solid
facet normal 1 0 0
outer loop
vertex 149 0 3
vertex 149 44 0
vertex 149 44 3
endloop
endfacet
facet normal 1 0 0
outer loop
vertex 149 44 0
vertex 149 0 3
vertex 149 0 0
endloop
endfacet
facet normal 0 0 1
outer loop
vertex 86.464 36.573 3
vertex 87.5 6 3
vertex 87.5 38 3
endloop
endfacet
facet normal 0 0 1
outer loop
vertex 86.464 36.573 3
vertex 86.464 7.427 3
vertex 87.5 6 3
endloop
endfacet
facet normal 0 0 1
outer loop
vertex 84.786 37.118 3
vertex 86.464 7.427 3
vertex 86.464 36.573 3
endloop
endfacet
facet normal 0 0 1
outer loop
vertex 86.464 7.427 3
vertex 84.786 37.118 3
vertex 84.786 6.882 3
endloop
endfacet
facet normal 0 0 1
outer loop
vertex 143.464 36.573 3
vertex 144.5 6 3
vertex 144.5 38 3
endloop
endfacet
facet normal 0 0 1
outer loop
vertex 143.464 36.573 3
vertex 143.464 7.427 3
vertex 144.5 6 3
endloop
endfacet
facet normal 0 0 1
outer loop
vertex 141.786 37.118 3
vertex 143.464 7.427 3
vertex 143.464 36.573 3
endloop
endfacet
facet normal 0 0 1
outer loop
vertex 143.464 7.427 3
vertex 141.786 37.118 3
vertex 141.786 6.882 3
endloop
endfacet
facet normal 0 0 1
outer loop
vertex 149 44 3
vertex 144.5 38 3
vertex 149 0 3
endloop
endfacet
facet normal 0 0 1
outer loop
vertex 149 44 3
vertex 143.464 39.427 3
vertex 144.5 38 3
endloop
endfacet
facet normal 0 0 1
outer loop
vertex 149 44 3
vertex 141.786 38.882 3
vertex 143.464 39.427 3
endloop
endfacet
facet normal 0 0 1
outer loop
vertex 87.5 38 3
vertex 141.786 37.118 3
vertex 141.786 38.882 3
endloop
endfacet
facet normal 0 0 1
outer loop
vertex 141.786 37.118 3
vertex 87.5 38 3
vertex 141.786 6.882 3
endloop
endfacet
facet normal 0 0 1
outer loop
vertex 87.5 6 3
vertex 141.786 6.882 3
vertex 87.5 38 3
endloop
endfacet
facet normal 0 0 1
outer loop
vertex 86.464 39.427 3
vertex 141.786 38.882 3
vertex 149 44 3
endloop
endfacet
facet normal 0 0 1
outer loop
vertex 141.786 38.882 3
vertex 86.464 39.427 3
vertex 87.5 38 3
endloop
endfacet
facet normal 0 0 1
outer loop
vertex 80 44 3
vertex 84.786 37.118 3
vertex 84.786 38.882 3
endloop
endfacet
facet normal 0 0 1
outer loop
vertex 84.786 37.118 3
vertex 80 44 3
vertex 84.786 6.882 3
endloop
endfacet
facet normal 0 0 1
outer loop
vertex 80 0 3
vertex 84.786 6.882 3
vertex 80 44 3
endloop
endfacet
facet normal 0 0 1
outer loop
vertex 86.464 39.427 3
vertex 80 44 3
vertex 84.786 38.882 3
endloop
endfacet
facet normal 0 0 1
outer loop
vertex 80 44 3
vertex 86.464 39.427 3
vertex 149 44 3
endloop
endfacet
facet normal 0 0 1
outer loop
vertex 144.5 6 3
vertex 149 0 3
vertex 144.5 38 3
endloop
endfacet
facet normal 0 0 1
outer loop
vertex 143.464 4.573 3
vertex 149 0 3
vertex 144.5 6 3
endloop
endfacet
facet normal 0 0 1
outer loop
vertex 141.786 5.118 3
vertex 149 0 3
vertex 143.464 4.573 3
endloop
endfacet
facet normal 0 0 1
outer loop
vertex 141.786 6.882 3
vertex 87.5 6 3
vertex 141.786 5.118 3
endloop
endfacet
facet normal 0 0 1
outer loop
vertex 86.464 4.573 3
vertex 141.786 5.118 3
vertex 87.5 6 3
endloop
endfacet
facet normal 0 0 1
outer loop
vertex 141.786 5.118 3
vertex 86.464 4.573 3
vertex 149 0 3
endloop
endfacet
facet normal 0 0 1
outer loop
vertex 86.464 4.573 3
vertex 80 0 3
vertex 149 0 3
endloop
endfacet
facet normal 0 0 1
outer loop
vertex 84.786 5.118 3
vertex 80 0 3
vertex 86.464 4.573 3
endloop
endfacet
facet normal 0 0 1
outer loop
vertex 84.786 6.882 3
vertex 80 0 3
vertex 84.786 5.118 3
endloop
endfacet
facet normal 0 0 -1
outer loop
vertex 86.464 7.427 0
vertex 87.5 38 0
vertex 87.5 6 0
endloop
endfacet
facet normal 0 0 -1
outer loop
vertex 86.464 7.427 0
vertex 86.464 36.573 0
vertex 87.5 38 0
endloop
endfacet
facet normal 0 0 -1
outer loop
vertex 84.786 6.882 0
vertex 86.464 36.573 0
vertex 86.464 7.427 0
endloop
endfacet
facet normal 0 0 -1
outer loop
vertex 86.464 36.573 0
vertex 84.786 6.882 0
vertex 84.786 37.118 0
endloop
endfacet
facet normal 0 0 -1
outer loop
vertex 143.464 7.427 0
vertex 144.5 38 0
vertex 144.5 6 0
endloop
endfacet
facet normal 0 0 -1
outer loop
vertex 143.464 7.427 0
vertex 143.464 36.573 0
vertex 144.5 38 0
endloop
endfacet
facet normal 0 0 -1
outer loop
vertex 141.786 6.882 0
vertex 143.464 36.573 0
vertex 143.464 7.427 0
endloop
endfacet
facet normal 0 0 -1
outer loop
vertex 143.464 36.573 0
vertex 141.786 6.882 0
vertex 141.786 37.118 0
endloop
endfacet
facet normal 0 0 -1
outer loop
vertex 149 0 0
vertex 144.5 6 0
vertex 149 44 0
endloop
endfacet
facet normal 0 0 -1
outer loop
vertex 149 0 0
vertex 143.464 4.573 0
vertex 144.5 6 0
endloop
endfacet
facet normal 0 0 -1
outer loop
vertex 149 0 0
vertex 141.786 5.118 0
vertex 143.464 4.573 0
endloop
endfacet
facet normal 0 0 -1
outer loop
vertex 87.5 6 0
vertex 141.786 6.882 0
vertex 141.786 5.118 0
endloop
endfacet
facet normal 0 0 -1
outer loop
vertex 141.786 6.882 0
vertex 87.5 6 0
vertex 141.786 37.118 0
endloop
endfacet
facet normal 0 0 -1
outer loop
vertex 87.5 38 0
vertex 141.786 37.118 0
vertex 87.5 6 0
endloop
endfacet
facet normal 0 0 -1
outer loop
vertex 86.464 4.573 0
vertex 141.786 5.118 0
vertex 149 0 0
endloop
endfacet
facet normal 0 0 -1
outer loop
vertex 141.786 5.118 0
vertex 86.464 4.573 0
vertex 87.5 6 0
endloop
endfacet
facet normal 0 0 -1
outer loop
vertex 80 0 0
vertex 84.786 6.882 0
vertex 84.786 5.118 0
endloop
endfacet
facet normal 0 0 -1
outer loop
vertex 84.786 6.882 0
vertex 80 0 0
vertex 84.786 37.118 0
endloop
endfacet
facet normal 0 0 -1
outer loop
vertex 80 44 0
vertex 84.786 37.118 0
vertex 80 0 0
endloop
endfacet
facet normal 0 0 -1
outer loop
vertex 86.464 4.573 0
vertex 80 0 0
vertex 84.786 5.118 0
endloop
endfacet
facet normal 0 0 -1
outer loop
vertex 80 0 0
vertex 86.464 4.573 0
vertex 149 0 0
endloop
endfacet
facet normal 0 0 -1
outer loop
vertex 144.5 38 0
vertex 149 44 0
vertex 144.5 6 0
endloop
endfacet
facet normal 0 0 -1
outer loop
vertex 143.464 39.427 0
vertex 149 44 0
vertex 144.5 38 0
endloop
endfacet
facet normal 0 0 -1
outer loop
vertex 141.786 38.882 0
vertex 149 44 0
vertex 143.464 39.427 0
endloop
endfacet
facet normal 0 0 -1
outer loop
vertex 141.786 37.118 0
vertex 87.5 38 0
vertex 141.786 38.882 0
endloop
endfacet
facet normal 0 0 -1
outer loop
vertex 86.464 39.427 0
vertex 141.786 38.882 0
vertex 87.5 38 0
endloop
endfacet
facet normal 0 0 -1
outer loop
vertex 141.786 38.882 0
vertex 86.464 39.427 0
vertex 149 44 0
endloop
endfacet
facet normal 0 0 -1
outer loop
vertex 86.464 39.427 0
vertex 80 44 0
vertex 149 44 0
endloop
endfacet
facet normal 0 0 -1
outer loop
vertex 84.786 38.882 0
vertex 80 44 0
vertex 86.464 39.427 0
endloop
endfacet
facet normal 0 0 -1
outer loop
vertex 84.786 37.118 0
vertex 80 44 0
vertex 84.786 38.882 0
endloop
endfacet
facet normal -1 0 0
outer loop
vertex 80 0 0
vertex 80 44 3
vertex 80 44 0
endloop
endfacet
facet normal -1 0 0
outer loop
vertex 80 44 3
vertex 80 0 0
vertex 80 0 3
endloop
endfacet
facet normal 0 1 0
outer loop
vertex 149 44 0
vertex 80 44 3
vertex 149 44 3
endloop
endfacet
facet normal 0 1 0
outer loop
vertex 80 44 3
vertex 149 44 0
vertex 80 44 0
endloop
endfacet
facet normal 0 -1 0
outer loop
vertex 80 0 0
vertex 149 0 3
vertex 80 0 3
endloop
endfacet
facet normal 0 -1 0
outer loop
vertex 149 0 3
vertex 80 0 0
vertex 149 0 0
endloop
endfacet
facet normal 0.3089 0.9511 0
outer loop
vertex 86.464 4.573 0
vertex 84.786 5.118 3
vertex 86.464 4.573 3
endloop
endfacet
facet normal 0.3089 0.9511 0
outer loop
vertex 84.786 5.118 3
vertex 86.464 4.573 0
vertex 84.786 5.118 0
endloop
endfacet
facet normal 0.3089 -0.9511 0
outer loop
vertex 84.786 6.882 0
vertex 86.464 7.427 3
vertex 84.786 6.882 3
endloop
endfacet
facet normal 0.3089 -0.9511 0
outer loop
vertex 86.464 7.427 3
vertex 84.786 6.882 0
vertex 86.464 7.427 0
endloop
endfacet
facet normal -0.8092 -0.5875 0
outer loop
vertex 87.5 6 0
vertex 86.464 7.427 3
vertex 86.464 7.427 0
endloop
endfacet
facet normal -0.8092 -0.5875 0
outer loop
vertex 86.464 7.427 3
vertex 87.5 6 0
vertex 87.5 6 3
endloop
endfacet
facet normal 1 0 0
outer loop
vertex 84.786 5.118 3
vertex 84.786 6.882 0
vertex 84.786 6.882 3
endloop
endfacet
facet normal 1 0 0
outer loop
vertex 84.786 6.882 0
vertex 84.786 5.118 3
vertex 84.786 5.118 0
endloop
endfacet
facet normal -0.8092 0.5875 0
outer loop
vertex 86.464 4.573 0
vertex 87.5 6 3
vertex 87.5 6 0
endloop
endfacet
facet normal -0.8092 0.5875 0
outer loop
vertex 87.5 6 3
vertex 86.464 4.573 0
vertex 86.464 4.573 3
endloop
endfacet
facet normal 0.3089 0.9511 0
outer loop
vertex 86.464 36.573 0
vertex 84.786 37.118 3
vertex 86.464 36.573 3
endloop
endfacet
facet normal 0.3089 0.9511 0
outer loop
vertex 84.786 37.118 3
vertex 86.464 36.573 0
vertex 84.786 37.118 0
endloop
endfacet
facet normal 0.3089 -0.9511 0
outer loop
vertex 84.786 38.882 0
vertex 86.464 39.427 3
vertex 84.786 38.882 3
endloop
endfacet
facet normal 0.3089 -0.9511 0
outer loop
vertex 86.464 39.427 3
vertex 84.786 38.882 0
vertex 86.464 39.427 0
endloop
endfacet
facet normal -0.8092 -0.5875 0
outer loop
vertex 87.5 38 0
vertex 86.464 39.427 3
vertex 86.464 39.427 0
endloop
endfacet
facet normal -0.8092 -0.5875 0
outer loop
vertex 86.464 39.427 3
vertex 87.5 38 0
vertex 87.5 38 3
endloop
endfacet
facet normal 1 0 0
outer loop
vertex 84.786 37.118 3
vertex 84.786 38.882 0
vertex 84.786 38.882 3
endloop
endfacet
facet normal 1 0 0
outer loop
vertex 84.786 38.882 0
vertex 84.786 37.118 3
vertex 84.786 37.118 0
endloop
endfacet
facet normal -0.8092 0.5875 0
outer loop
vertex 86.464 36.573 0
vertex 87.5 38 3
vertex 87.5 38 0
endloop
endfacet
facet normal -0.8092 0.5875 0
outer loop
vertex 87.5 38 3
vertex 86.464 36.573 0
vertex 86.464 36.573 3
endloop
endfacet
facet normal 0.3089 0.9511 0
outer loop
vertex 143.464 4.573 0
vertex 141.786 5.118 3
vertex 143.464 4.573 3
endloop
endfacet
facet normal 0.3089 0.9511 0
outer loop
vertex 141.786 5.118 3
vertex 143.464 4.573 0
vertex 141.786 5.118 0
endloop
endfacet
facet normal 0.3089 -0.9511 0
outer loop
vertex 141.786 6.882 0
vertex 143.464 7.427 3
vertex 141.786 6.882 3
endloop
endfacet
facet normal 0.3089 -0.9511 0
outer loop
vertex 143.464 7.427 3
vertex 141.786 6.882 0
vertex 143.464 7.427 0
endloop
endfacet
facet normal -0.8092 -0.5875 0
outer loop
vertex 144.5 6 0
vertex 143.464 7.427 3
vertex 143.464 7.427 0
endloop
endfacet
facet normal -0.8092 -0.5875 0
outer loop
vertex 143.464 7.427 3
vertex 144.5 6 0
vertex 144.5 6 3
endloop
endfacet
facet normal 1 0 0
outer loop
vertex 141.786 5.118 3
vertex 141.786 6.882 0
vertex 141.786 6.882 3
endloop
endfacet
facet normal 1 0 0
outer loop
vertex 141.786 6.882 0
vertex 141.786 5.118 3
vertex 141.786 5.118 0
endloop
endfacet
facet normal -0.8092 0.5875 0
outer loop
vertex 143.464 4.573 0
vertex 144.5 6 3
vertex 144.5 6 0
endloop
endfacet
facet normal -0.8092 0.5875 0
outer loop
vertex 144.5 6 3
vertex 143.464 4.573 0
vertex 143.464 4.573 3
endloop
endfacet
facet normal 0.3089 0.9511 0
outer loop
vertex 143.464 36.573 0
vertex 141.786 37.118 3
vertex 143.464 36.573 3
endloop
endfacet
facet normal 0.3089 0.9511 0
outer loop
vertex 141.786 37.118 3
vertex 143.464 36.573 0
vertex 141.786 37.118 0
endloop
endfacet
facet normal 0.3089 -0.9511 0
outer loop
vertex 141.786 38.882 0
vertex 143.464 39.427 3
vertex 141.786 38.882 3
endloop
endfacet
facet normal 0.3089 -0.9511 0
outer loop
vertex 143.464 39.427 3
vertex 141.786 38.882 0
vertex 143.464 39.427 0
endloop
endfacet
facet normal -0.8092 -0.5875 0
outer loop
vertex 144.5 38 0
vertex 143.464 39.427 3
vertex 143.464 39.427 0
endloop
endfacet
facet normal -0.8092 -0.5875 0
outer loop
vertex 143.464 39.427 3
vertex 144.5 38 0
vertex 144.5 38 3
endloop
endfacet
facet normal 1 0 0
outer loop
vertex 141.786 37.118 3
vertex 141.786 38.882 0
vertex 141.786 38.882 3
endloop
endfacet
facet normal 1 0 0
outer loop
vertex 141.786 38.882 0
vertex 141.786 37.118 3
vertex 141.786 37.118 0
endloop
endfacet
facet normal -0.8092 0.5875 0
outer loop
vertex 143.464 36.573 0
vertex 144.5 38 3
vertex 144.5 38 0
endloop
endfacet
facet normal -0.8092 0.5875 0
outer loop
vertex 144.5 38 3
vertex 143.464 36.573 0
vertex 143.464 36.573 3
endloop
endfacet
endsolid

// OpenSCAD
// Arduino Nano 33 BLE Sense Enclosure
// Units: mm
// Designed for FDM 3D printing (PLA, PETG, ABS)

// Base module (bottom part)
module base() {
    difference() {
        union() {
            // Outer shell of the base
            cube([69, 44, 22]);
            
            // Add screw posts at corners (~6 mm from edges)
            translate([6, 6, 2]) cylinder(h=20, r=4);
            translate([6, 38, 2]) cylinder(h=20, r=4);
            translate([63, 6, 2]) cylinder(h=20, r=4);
            translate([63, 38, 2]) cylinder(h=20, r=4);
            
            // Add Arduino mounting standoffs
            // Positioned to match Arduino Nano 33 BLE Sense holes (38.1 mm apart)
            translate([15.45, 12, 2]) cylinder(h=2, r=2.5);
            translate([53.55, 12, 2]) cylinder(h=2, r=2.5);
        }
        
        // Subtract internal cavity (65 x 40 x 20 mm)
        translate([2, 2, 2]) cube([65, 40, 20]);
        
        // Subtract M3 screw holes from screw posts (Ø 3 mm)
        translate([6, 6, 2]) cylinder(h=20, r=1.5);
        translate([6, 38, 2]) cylinder(h=20, r=1.5);
        translate([63, 6, 2]) cylinder(h=20, r=1.5);
        translate([63, 38, 2]) cylinder(h=20, r=1.5);
        
        // Subtract M2 screw holes from standoffs (Ø 2.2 mm)
        translate([15.45, 12, 2]) cylinder(h=2, r=1.1);
        translate([53.55, 12, 2]) cylinder(h=2, r=1.1);
        
        // Subtract gasket groove (1.5 mm deep, along top edge)
        translate([0, 0, 20.5]) linear_extrude(1.5) difference() {
            square([69, 44]);
            translate([2, 2]) square([65, 40]);
        }
    }
}

// Lid module (top cover)
module lid() {
    difference() {
        // Flat lid (69 x 44 x 3 mm)
        cube([69, 44, 3]);
        
        // Subtract M3 screw holes (Ø 3 mm, aligned with screw posts)
        translate([6, 6, -1]) cylinder(h=5, r=1.5);
        translate([6, 38, -1]) cylinder(h=5, r=1.5);
        translate([63, 6, -1]) cylinder(h=5, r=1.5);
        translate([63, 38, -1]) cylinder(h=5, r=1.5);
    }
}

// Render the parts (uncomment one at a time for printing)
//base();
translate([80, 0, 0]) lid(); // Optional: view lid beside base
